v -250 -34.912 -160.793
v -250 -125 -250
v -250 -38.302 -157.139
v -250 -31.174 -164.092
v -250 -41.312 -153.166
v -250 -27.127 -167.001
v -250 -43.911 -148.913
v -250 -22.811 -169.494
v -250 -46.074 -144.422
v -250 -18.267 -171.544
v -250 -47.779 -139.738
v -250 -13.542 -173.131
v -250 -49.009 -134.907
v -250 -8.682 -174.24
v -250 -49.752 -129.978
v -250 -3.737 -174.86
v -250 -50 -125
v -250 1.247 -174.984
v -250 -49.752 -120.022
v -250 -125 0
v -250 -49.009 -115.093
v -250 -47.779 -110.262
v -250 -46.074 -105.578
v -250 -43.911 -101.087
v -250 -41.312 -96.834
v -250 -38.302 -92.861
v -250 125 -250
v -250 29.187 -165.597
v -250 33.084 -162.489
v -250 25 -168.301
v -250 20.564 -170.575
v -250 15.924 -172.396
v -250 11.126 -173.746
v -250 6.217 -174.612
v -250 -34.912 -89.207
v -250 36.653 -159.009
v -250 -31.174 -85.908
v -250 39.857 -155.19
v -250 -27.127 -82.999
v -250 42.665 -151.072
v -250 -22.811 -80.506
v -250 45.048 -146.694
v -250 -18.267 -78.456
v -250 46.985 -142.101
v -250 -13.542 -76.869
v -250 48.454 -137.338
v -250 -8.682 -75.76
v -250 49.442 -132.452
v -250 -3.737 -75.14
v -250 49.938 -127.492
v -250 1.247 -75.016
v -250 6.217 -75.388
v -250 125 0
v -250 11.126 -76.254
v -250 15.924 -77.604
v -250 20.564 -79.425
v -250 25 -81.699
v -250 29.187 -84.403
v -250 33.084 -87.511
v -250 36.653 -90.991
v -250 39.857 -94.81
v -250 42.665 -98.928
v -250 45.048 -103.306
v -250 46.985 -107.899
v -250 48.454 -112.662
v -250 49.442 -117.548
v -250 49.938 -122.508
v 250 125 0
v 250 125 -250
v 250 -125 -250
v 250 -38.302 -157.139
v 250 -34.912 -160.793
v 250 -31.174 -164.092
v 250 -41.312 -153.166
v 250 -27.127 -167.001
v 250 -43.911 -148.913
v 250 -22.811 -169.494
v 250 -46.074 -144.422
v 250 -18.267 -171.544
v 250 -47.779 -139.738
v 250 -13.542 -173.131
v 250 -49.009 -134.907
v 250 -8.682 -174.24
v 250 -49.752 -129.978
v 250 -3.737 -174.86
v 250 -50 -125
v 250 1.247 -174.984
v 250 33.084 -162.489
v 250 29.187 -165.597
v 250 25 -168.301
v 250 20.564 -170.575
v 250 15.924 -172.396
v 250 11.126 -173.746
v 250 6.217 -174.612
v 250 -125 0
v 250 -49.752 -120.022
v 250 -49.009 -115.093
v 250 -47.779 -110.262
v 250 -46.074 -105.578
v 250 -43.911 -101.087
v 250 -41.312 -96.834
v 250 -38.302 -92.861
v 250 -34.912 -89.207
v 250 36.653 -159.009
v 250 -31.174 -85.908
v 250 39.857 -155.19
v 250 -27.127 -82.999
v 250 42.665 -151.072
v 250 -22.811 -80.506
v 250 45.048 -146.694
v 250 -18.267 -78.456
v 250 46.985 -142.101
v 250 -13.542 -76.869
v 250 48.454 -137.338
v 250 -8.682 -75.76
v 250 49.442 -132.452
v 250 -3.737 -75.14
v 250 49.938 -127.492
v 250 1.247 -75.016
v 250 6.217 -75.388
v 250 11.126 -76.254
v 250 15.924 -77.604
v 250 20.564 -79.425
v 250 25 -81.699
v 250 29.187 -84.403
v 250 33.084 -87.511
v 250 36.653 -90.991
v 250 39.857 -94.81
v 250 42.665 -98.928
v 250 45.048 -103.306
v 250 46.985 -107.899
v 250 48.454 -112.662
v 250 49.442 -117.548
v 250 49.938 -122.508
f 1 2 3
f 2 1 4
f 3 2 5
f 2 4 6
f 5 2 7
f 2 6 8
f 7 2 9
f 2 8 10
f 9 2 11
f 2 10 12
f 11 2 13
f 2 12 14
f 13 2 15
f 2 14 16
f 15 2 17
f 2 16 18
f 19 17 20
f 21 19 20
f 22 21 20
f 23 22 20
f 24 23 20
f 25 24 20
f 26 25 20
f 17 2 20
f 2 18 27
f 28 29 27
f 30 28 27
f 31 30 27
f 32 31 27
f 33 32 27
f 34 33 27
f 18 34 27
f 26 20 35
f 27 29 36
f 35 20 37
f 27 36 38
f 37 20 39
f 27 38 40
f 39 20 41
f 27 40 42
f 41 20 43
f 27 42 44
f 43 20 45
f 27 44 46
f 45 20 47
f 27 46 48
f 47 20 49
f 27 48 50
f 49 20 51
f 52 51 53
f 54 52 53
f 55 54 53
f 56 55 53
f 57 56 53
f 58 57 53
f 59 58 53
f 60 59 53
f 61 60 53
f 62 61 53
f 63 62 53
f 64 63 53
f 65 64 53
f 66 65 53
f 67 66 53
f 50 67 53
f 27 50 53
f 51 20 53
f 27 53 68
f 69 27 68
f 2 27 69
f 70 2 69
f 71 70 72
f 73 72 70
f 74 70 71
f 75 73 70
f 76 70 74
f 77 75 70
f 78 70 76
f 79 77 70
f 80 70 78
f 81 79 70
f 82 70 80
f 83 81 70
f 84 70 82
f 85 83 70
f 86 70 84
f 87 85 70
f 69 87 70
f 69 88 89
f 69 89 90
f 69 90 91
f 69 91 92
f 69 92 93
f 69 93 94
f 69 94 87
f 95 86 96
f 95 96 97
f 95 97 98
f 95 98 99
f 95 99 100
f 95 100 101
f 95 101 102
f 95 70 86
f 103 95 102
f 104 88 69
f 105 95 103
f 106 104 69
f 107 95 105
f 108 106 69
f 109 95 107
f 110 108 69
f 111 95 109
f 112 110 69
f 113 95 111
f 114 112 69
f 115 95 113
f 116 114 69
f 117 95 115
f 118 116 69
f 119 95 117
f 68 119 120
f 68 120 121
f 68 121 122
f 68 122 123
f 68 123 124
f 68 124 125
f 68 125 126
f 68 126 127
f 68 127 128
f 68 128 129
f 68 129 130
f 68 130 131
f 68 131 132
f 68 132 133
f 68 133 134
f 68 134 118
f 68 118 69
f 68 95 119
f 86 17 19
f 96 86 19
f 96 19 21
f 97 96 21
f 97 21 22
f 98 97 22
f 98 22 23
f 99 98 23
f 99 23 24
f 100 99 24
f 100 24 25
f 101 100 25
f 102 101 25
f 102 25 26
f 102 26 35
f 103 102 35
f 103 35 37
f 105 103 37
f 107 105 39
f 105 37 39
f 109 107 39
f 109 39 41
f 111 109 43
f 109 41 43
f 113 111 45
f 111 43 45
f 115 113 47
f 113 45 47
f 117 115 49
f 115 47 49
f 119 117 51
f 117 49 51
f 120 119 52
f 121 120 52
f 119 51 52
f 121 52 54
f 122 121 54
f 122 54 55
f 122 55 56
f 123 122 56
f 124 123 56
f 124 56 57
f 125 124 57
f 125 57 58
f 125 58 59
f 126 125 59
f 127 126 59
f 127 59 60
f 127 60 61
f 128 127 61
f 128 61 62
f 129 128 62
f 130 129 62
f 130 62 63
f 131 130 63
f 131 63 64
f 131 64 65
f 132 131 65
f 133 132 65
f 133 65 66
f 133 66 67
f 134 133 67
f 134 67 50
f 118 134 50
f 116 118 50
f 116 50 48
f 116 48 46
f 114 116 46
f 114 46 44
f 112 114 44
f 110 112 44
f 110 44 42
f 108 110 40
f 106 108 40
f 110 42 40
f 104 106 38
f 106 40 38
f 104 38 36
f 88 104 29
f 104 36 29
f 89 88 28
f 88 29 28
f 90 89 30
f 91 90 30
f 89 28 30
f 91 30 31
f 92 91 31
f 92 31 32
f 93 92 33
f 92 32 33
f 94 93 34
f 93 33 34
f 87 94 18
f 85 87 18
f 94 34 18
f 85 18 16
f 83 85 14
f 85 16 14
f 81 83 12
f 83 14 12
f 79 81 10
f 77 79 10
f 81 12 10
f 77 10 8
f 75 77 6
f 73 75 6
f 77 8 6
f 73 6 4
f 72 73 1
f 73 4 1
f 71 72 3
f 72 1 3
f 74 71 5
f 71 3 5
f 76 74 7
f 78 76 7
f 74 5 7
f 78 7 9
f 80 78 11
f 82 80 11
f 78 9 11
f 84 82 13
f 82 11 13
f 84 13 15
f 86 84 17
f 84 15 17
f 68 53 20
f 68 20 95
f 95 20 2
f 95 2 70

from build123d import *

# Parameters (mm, degrees)
F0_W     = 500
F0_H     = 250
F1_DEPTH = 250
F3_DEPTH = 110.811708
F6_D     = 100


with BuildPart() as f1:
    # F0 (on Top) → F1 (new body)
    with BuildSketch(Plane.XY):
        Rectangle(F0_W, F0_H)
    extrude(amount=-F1_DEPTH)

    # F2 (on face) → F3 (join)
    with BuildSketch(Plane.YZ.offset(250)):
        with BuildLine():
            Line((50, -125), (125, -125))
            Line((125, -125), (125, 0))
            Line((125, 0), (0, 0))
            Line((0, 0), (0, -75))
            ThreePointArc((0, -75), (35.355339, -89.644661), (50, -125))
        make_face()
        with BuildLine():
            Line((0, -125), (50, -125))
            ThreePointArc((50, -125), (35.355339, -89.644661), (0, -75))
            Line((0, -75), (0, -125))
        make_face()
        with BuildLine():
            ThreePointArc((0, -175), (35.355339, -160.355339), (50, -125))
            Line((50, -125), (0, -125))
            Line((0, -125), (0, -175))
        make_face()
        with BuildLine():
            Line((125, -250), (125, -125))
            Line((125, -125), (50, -125))
            ThreePointArc((50, -125), (35.355339, -160.355339), (0, -175))
            Line((0, -175), (0, -250))
            Line((0, -250), (125, -250))
        make_face()
    extrude(amount=-F3_DEPTH)

    # F6 (through all)
    with Locations(Plane.YZ.offset(250)):
        with Locations((0, -125)):
            Hole(F6_D / 2)


solid = f1.part
